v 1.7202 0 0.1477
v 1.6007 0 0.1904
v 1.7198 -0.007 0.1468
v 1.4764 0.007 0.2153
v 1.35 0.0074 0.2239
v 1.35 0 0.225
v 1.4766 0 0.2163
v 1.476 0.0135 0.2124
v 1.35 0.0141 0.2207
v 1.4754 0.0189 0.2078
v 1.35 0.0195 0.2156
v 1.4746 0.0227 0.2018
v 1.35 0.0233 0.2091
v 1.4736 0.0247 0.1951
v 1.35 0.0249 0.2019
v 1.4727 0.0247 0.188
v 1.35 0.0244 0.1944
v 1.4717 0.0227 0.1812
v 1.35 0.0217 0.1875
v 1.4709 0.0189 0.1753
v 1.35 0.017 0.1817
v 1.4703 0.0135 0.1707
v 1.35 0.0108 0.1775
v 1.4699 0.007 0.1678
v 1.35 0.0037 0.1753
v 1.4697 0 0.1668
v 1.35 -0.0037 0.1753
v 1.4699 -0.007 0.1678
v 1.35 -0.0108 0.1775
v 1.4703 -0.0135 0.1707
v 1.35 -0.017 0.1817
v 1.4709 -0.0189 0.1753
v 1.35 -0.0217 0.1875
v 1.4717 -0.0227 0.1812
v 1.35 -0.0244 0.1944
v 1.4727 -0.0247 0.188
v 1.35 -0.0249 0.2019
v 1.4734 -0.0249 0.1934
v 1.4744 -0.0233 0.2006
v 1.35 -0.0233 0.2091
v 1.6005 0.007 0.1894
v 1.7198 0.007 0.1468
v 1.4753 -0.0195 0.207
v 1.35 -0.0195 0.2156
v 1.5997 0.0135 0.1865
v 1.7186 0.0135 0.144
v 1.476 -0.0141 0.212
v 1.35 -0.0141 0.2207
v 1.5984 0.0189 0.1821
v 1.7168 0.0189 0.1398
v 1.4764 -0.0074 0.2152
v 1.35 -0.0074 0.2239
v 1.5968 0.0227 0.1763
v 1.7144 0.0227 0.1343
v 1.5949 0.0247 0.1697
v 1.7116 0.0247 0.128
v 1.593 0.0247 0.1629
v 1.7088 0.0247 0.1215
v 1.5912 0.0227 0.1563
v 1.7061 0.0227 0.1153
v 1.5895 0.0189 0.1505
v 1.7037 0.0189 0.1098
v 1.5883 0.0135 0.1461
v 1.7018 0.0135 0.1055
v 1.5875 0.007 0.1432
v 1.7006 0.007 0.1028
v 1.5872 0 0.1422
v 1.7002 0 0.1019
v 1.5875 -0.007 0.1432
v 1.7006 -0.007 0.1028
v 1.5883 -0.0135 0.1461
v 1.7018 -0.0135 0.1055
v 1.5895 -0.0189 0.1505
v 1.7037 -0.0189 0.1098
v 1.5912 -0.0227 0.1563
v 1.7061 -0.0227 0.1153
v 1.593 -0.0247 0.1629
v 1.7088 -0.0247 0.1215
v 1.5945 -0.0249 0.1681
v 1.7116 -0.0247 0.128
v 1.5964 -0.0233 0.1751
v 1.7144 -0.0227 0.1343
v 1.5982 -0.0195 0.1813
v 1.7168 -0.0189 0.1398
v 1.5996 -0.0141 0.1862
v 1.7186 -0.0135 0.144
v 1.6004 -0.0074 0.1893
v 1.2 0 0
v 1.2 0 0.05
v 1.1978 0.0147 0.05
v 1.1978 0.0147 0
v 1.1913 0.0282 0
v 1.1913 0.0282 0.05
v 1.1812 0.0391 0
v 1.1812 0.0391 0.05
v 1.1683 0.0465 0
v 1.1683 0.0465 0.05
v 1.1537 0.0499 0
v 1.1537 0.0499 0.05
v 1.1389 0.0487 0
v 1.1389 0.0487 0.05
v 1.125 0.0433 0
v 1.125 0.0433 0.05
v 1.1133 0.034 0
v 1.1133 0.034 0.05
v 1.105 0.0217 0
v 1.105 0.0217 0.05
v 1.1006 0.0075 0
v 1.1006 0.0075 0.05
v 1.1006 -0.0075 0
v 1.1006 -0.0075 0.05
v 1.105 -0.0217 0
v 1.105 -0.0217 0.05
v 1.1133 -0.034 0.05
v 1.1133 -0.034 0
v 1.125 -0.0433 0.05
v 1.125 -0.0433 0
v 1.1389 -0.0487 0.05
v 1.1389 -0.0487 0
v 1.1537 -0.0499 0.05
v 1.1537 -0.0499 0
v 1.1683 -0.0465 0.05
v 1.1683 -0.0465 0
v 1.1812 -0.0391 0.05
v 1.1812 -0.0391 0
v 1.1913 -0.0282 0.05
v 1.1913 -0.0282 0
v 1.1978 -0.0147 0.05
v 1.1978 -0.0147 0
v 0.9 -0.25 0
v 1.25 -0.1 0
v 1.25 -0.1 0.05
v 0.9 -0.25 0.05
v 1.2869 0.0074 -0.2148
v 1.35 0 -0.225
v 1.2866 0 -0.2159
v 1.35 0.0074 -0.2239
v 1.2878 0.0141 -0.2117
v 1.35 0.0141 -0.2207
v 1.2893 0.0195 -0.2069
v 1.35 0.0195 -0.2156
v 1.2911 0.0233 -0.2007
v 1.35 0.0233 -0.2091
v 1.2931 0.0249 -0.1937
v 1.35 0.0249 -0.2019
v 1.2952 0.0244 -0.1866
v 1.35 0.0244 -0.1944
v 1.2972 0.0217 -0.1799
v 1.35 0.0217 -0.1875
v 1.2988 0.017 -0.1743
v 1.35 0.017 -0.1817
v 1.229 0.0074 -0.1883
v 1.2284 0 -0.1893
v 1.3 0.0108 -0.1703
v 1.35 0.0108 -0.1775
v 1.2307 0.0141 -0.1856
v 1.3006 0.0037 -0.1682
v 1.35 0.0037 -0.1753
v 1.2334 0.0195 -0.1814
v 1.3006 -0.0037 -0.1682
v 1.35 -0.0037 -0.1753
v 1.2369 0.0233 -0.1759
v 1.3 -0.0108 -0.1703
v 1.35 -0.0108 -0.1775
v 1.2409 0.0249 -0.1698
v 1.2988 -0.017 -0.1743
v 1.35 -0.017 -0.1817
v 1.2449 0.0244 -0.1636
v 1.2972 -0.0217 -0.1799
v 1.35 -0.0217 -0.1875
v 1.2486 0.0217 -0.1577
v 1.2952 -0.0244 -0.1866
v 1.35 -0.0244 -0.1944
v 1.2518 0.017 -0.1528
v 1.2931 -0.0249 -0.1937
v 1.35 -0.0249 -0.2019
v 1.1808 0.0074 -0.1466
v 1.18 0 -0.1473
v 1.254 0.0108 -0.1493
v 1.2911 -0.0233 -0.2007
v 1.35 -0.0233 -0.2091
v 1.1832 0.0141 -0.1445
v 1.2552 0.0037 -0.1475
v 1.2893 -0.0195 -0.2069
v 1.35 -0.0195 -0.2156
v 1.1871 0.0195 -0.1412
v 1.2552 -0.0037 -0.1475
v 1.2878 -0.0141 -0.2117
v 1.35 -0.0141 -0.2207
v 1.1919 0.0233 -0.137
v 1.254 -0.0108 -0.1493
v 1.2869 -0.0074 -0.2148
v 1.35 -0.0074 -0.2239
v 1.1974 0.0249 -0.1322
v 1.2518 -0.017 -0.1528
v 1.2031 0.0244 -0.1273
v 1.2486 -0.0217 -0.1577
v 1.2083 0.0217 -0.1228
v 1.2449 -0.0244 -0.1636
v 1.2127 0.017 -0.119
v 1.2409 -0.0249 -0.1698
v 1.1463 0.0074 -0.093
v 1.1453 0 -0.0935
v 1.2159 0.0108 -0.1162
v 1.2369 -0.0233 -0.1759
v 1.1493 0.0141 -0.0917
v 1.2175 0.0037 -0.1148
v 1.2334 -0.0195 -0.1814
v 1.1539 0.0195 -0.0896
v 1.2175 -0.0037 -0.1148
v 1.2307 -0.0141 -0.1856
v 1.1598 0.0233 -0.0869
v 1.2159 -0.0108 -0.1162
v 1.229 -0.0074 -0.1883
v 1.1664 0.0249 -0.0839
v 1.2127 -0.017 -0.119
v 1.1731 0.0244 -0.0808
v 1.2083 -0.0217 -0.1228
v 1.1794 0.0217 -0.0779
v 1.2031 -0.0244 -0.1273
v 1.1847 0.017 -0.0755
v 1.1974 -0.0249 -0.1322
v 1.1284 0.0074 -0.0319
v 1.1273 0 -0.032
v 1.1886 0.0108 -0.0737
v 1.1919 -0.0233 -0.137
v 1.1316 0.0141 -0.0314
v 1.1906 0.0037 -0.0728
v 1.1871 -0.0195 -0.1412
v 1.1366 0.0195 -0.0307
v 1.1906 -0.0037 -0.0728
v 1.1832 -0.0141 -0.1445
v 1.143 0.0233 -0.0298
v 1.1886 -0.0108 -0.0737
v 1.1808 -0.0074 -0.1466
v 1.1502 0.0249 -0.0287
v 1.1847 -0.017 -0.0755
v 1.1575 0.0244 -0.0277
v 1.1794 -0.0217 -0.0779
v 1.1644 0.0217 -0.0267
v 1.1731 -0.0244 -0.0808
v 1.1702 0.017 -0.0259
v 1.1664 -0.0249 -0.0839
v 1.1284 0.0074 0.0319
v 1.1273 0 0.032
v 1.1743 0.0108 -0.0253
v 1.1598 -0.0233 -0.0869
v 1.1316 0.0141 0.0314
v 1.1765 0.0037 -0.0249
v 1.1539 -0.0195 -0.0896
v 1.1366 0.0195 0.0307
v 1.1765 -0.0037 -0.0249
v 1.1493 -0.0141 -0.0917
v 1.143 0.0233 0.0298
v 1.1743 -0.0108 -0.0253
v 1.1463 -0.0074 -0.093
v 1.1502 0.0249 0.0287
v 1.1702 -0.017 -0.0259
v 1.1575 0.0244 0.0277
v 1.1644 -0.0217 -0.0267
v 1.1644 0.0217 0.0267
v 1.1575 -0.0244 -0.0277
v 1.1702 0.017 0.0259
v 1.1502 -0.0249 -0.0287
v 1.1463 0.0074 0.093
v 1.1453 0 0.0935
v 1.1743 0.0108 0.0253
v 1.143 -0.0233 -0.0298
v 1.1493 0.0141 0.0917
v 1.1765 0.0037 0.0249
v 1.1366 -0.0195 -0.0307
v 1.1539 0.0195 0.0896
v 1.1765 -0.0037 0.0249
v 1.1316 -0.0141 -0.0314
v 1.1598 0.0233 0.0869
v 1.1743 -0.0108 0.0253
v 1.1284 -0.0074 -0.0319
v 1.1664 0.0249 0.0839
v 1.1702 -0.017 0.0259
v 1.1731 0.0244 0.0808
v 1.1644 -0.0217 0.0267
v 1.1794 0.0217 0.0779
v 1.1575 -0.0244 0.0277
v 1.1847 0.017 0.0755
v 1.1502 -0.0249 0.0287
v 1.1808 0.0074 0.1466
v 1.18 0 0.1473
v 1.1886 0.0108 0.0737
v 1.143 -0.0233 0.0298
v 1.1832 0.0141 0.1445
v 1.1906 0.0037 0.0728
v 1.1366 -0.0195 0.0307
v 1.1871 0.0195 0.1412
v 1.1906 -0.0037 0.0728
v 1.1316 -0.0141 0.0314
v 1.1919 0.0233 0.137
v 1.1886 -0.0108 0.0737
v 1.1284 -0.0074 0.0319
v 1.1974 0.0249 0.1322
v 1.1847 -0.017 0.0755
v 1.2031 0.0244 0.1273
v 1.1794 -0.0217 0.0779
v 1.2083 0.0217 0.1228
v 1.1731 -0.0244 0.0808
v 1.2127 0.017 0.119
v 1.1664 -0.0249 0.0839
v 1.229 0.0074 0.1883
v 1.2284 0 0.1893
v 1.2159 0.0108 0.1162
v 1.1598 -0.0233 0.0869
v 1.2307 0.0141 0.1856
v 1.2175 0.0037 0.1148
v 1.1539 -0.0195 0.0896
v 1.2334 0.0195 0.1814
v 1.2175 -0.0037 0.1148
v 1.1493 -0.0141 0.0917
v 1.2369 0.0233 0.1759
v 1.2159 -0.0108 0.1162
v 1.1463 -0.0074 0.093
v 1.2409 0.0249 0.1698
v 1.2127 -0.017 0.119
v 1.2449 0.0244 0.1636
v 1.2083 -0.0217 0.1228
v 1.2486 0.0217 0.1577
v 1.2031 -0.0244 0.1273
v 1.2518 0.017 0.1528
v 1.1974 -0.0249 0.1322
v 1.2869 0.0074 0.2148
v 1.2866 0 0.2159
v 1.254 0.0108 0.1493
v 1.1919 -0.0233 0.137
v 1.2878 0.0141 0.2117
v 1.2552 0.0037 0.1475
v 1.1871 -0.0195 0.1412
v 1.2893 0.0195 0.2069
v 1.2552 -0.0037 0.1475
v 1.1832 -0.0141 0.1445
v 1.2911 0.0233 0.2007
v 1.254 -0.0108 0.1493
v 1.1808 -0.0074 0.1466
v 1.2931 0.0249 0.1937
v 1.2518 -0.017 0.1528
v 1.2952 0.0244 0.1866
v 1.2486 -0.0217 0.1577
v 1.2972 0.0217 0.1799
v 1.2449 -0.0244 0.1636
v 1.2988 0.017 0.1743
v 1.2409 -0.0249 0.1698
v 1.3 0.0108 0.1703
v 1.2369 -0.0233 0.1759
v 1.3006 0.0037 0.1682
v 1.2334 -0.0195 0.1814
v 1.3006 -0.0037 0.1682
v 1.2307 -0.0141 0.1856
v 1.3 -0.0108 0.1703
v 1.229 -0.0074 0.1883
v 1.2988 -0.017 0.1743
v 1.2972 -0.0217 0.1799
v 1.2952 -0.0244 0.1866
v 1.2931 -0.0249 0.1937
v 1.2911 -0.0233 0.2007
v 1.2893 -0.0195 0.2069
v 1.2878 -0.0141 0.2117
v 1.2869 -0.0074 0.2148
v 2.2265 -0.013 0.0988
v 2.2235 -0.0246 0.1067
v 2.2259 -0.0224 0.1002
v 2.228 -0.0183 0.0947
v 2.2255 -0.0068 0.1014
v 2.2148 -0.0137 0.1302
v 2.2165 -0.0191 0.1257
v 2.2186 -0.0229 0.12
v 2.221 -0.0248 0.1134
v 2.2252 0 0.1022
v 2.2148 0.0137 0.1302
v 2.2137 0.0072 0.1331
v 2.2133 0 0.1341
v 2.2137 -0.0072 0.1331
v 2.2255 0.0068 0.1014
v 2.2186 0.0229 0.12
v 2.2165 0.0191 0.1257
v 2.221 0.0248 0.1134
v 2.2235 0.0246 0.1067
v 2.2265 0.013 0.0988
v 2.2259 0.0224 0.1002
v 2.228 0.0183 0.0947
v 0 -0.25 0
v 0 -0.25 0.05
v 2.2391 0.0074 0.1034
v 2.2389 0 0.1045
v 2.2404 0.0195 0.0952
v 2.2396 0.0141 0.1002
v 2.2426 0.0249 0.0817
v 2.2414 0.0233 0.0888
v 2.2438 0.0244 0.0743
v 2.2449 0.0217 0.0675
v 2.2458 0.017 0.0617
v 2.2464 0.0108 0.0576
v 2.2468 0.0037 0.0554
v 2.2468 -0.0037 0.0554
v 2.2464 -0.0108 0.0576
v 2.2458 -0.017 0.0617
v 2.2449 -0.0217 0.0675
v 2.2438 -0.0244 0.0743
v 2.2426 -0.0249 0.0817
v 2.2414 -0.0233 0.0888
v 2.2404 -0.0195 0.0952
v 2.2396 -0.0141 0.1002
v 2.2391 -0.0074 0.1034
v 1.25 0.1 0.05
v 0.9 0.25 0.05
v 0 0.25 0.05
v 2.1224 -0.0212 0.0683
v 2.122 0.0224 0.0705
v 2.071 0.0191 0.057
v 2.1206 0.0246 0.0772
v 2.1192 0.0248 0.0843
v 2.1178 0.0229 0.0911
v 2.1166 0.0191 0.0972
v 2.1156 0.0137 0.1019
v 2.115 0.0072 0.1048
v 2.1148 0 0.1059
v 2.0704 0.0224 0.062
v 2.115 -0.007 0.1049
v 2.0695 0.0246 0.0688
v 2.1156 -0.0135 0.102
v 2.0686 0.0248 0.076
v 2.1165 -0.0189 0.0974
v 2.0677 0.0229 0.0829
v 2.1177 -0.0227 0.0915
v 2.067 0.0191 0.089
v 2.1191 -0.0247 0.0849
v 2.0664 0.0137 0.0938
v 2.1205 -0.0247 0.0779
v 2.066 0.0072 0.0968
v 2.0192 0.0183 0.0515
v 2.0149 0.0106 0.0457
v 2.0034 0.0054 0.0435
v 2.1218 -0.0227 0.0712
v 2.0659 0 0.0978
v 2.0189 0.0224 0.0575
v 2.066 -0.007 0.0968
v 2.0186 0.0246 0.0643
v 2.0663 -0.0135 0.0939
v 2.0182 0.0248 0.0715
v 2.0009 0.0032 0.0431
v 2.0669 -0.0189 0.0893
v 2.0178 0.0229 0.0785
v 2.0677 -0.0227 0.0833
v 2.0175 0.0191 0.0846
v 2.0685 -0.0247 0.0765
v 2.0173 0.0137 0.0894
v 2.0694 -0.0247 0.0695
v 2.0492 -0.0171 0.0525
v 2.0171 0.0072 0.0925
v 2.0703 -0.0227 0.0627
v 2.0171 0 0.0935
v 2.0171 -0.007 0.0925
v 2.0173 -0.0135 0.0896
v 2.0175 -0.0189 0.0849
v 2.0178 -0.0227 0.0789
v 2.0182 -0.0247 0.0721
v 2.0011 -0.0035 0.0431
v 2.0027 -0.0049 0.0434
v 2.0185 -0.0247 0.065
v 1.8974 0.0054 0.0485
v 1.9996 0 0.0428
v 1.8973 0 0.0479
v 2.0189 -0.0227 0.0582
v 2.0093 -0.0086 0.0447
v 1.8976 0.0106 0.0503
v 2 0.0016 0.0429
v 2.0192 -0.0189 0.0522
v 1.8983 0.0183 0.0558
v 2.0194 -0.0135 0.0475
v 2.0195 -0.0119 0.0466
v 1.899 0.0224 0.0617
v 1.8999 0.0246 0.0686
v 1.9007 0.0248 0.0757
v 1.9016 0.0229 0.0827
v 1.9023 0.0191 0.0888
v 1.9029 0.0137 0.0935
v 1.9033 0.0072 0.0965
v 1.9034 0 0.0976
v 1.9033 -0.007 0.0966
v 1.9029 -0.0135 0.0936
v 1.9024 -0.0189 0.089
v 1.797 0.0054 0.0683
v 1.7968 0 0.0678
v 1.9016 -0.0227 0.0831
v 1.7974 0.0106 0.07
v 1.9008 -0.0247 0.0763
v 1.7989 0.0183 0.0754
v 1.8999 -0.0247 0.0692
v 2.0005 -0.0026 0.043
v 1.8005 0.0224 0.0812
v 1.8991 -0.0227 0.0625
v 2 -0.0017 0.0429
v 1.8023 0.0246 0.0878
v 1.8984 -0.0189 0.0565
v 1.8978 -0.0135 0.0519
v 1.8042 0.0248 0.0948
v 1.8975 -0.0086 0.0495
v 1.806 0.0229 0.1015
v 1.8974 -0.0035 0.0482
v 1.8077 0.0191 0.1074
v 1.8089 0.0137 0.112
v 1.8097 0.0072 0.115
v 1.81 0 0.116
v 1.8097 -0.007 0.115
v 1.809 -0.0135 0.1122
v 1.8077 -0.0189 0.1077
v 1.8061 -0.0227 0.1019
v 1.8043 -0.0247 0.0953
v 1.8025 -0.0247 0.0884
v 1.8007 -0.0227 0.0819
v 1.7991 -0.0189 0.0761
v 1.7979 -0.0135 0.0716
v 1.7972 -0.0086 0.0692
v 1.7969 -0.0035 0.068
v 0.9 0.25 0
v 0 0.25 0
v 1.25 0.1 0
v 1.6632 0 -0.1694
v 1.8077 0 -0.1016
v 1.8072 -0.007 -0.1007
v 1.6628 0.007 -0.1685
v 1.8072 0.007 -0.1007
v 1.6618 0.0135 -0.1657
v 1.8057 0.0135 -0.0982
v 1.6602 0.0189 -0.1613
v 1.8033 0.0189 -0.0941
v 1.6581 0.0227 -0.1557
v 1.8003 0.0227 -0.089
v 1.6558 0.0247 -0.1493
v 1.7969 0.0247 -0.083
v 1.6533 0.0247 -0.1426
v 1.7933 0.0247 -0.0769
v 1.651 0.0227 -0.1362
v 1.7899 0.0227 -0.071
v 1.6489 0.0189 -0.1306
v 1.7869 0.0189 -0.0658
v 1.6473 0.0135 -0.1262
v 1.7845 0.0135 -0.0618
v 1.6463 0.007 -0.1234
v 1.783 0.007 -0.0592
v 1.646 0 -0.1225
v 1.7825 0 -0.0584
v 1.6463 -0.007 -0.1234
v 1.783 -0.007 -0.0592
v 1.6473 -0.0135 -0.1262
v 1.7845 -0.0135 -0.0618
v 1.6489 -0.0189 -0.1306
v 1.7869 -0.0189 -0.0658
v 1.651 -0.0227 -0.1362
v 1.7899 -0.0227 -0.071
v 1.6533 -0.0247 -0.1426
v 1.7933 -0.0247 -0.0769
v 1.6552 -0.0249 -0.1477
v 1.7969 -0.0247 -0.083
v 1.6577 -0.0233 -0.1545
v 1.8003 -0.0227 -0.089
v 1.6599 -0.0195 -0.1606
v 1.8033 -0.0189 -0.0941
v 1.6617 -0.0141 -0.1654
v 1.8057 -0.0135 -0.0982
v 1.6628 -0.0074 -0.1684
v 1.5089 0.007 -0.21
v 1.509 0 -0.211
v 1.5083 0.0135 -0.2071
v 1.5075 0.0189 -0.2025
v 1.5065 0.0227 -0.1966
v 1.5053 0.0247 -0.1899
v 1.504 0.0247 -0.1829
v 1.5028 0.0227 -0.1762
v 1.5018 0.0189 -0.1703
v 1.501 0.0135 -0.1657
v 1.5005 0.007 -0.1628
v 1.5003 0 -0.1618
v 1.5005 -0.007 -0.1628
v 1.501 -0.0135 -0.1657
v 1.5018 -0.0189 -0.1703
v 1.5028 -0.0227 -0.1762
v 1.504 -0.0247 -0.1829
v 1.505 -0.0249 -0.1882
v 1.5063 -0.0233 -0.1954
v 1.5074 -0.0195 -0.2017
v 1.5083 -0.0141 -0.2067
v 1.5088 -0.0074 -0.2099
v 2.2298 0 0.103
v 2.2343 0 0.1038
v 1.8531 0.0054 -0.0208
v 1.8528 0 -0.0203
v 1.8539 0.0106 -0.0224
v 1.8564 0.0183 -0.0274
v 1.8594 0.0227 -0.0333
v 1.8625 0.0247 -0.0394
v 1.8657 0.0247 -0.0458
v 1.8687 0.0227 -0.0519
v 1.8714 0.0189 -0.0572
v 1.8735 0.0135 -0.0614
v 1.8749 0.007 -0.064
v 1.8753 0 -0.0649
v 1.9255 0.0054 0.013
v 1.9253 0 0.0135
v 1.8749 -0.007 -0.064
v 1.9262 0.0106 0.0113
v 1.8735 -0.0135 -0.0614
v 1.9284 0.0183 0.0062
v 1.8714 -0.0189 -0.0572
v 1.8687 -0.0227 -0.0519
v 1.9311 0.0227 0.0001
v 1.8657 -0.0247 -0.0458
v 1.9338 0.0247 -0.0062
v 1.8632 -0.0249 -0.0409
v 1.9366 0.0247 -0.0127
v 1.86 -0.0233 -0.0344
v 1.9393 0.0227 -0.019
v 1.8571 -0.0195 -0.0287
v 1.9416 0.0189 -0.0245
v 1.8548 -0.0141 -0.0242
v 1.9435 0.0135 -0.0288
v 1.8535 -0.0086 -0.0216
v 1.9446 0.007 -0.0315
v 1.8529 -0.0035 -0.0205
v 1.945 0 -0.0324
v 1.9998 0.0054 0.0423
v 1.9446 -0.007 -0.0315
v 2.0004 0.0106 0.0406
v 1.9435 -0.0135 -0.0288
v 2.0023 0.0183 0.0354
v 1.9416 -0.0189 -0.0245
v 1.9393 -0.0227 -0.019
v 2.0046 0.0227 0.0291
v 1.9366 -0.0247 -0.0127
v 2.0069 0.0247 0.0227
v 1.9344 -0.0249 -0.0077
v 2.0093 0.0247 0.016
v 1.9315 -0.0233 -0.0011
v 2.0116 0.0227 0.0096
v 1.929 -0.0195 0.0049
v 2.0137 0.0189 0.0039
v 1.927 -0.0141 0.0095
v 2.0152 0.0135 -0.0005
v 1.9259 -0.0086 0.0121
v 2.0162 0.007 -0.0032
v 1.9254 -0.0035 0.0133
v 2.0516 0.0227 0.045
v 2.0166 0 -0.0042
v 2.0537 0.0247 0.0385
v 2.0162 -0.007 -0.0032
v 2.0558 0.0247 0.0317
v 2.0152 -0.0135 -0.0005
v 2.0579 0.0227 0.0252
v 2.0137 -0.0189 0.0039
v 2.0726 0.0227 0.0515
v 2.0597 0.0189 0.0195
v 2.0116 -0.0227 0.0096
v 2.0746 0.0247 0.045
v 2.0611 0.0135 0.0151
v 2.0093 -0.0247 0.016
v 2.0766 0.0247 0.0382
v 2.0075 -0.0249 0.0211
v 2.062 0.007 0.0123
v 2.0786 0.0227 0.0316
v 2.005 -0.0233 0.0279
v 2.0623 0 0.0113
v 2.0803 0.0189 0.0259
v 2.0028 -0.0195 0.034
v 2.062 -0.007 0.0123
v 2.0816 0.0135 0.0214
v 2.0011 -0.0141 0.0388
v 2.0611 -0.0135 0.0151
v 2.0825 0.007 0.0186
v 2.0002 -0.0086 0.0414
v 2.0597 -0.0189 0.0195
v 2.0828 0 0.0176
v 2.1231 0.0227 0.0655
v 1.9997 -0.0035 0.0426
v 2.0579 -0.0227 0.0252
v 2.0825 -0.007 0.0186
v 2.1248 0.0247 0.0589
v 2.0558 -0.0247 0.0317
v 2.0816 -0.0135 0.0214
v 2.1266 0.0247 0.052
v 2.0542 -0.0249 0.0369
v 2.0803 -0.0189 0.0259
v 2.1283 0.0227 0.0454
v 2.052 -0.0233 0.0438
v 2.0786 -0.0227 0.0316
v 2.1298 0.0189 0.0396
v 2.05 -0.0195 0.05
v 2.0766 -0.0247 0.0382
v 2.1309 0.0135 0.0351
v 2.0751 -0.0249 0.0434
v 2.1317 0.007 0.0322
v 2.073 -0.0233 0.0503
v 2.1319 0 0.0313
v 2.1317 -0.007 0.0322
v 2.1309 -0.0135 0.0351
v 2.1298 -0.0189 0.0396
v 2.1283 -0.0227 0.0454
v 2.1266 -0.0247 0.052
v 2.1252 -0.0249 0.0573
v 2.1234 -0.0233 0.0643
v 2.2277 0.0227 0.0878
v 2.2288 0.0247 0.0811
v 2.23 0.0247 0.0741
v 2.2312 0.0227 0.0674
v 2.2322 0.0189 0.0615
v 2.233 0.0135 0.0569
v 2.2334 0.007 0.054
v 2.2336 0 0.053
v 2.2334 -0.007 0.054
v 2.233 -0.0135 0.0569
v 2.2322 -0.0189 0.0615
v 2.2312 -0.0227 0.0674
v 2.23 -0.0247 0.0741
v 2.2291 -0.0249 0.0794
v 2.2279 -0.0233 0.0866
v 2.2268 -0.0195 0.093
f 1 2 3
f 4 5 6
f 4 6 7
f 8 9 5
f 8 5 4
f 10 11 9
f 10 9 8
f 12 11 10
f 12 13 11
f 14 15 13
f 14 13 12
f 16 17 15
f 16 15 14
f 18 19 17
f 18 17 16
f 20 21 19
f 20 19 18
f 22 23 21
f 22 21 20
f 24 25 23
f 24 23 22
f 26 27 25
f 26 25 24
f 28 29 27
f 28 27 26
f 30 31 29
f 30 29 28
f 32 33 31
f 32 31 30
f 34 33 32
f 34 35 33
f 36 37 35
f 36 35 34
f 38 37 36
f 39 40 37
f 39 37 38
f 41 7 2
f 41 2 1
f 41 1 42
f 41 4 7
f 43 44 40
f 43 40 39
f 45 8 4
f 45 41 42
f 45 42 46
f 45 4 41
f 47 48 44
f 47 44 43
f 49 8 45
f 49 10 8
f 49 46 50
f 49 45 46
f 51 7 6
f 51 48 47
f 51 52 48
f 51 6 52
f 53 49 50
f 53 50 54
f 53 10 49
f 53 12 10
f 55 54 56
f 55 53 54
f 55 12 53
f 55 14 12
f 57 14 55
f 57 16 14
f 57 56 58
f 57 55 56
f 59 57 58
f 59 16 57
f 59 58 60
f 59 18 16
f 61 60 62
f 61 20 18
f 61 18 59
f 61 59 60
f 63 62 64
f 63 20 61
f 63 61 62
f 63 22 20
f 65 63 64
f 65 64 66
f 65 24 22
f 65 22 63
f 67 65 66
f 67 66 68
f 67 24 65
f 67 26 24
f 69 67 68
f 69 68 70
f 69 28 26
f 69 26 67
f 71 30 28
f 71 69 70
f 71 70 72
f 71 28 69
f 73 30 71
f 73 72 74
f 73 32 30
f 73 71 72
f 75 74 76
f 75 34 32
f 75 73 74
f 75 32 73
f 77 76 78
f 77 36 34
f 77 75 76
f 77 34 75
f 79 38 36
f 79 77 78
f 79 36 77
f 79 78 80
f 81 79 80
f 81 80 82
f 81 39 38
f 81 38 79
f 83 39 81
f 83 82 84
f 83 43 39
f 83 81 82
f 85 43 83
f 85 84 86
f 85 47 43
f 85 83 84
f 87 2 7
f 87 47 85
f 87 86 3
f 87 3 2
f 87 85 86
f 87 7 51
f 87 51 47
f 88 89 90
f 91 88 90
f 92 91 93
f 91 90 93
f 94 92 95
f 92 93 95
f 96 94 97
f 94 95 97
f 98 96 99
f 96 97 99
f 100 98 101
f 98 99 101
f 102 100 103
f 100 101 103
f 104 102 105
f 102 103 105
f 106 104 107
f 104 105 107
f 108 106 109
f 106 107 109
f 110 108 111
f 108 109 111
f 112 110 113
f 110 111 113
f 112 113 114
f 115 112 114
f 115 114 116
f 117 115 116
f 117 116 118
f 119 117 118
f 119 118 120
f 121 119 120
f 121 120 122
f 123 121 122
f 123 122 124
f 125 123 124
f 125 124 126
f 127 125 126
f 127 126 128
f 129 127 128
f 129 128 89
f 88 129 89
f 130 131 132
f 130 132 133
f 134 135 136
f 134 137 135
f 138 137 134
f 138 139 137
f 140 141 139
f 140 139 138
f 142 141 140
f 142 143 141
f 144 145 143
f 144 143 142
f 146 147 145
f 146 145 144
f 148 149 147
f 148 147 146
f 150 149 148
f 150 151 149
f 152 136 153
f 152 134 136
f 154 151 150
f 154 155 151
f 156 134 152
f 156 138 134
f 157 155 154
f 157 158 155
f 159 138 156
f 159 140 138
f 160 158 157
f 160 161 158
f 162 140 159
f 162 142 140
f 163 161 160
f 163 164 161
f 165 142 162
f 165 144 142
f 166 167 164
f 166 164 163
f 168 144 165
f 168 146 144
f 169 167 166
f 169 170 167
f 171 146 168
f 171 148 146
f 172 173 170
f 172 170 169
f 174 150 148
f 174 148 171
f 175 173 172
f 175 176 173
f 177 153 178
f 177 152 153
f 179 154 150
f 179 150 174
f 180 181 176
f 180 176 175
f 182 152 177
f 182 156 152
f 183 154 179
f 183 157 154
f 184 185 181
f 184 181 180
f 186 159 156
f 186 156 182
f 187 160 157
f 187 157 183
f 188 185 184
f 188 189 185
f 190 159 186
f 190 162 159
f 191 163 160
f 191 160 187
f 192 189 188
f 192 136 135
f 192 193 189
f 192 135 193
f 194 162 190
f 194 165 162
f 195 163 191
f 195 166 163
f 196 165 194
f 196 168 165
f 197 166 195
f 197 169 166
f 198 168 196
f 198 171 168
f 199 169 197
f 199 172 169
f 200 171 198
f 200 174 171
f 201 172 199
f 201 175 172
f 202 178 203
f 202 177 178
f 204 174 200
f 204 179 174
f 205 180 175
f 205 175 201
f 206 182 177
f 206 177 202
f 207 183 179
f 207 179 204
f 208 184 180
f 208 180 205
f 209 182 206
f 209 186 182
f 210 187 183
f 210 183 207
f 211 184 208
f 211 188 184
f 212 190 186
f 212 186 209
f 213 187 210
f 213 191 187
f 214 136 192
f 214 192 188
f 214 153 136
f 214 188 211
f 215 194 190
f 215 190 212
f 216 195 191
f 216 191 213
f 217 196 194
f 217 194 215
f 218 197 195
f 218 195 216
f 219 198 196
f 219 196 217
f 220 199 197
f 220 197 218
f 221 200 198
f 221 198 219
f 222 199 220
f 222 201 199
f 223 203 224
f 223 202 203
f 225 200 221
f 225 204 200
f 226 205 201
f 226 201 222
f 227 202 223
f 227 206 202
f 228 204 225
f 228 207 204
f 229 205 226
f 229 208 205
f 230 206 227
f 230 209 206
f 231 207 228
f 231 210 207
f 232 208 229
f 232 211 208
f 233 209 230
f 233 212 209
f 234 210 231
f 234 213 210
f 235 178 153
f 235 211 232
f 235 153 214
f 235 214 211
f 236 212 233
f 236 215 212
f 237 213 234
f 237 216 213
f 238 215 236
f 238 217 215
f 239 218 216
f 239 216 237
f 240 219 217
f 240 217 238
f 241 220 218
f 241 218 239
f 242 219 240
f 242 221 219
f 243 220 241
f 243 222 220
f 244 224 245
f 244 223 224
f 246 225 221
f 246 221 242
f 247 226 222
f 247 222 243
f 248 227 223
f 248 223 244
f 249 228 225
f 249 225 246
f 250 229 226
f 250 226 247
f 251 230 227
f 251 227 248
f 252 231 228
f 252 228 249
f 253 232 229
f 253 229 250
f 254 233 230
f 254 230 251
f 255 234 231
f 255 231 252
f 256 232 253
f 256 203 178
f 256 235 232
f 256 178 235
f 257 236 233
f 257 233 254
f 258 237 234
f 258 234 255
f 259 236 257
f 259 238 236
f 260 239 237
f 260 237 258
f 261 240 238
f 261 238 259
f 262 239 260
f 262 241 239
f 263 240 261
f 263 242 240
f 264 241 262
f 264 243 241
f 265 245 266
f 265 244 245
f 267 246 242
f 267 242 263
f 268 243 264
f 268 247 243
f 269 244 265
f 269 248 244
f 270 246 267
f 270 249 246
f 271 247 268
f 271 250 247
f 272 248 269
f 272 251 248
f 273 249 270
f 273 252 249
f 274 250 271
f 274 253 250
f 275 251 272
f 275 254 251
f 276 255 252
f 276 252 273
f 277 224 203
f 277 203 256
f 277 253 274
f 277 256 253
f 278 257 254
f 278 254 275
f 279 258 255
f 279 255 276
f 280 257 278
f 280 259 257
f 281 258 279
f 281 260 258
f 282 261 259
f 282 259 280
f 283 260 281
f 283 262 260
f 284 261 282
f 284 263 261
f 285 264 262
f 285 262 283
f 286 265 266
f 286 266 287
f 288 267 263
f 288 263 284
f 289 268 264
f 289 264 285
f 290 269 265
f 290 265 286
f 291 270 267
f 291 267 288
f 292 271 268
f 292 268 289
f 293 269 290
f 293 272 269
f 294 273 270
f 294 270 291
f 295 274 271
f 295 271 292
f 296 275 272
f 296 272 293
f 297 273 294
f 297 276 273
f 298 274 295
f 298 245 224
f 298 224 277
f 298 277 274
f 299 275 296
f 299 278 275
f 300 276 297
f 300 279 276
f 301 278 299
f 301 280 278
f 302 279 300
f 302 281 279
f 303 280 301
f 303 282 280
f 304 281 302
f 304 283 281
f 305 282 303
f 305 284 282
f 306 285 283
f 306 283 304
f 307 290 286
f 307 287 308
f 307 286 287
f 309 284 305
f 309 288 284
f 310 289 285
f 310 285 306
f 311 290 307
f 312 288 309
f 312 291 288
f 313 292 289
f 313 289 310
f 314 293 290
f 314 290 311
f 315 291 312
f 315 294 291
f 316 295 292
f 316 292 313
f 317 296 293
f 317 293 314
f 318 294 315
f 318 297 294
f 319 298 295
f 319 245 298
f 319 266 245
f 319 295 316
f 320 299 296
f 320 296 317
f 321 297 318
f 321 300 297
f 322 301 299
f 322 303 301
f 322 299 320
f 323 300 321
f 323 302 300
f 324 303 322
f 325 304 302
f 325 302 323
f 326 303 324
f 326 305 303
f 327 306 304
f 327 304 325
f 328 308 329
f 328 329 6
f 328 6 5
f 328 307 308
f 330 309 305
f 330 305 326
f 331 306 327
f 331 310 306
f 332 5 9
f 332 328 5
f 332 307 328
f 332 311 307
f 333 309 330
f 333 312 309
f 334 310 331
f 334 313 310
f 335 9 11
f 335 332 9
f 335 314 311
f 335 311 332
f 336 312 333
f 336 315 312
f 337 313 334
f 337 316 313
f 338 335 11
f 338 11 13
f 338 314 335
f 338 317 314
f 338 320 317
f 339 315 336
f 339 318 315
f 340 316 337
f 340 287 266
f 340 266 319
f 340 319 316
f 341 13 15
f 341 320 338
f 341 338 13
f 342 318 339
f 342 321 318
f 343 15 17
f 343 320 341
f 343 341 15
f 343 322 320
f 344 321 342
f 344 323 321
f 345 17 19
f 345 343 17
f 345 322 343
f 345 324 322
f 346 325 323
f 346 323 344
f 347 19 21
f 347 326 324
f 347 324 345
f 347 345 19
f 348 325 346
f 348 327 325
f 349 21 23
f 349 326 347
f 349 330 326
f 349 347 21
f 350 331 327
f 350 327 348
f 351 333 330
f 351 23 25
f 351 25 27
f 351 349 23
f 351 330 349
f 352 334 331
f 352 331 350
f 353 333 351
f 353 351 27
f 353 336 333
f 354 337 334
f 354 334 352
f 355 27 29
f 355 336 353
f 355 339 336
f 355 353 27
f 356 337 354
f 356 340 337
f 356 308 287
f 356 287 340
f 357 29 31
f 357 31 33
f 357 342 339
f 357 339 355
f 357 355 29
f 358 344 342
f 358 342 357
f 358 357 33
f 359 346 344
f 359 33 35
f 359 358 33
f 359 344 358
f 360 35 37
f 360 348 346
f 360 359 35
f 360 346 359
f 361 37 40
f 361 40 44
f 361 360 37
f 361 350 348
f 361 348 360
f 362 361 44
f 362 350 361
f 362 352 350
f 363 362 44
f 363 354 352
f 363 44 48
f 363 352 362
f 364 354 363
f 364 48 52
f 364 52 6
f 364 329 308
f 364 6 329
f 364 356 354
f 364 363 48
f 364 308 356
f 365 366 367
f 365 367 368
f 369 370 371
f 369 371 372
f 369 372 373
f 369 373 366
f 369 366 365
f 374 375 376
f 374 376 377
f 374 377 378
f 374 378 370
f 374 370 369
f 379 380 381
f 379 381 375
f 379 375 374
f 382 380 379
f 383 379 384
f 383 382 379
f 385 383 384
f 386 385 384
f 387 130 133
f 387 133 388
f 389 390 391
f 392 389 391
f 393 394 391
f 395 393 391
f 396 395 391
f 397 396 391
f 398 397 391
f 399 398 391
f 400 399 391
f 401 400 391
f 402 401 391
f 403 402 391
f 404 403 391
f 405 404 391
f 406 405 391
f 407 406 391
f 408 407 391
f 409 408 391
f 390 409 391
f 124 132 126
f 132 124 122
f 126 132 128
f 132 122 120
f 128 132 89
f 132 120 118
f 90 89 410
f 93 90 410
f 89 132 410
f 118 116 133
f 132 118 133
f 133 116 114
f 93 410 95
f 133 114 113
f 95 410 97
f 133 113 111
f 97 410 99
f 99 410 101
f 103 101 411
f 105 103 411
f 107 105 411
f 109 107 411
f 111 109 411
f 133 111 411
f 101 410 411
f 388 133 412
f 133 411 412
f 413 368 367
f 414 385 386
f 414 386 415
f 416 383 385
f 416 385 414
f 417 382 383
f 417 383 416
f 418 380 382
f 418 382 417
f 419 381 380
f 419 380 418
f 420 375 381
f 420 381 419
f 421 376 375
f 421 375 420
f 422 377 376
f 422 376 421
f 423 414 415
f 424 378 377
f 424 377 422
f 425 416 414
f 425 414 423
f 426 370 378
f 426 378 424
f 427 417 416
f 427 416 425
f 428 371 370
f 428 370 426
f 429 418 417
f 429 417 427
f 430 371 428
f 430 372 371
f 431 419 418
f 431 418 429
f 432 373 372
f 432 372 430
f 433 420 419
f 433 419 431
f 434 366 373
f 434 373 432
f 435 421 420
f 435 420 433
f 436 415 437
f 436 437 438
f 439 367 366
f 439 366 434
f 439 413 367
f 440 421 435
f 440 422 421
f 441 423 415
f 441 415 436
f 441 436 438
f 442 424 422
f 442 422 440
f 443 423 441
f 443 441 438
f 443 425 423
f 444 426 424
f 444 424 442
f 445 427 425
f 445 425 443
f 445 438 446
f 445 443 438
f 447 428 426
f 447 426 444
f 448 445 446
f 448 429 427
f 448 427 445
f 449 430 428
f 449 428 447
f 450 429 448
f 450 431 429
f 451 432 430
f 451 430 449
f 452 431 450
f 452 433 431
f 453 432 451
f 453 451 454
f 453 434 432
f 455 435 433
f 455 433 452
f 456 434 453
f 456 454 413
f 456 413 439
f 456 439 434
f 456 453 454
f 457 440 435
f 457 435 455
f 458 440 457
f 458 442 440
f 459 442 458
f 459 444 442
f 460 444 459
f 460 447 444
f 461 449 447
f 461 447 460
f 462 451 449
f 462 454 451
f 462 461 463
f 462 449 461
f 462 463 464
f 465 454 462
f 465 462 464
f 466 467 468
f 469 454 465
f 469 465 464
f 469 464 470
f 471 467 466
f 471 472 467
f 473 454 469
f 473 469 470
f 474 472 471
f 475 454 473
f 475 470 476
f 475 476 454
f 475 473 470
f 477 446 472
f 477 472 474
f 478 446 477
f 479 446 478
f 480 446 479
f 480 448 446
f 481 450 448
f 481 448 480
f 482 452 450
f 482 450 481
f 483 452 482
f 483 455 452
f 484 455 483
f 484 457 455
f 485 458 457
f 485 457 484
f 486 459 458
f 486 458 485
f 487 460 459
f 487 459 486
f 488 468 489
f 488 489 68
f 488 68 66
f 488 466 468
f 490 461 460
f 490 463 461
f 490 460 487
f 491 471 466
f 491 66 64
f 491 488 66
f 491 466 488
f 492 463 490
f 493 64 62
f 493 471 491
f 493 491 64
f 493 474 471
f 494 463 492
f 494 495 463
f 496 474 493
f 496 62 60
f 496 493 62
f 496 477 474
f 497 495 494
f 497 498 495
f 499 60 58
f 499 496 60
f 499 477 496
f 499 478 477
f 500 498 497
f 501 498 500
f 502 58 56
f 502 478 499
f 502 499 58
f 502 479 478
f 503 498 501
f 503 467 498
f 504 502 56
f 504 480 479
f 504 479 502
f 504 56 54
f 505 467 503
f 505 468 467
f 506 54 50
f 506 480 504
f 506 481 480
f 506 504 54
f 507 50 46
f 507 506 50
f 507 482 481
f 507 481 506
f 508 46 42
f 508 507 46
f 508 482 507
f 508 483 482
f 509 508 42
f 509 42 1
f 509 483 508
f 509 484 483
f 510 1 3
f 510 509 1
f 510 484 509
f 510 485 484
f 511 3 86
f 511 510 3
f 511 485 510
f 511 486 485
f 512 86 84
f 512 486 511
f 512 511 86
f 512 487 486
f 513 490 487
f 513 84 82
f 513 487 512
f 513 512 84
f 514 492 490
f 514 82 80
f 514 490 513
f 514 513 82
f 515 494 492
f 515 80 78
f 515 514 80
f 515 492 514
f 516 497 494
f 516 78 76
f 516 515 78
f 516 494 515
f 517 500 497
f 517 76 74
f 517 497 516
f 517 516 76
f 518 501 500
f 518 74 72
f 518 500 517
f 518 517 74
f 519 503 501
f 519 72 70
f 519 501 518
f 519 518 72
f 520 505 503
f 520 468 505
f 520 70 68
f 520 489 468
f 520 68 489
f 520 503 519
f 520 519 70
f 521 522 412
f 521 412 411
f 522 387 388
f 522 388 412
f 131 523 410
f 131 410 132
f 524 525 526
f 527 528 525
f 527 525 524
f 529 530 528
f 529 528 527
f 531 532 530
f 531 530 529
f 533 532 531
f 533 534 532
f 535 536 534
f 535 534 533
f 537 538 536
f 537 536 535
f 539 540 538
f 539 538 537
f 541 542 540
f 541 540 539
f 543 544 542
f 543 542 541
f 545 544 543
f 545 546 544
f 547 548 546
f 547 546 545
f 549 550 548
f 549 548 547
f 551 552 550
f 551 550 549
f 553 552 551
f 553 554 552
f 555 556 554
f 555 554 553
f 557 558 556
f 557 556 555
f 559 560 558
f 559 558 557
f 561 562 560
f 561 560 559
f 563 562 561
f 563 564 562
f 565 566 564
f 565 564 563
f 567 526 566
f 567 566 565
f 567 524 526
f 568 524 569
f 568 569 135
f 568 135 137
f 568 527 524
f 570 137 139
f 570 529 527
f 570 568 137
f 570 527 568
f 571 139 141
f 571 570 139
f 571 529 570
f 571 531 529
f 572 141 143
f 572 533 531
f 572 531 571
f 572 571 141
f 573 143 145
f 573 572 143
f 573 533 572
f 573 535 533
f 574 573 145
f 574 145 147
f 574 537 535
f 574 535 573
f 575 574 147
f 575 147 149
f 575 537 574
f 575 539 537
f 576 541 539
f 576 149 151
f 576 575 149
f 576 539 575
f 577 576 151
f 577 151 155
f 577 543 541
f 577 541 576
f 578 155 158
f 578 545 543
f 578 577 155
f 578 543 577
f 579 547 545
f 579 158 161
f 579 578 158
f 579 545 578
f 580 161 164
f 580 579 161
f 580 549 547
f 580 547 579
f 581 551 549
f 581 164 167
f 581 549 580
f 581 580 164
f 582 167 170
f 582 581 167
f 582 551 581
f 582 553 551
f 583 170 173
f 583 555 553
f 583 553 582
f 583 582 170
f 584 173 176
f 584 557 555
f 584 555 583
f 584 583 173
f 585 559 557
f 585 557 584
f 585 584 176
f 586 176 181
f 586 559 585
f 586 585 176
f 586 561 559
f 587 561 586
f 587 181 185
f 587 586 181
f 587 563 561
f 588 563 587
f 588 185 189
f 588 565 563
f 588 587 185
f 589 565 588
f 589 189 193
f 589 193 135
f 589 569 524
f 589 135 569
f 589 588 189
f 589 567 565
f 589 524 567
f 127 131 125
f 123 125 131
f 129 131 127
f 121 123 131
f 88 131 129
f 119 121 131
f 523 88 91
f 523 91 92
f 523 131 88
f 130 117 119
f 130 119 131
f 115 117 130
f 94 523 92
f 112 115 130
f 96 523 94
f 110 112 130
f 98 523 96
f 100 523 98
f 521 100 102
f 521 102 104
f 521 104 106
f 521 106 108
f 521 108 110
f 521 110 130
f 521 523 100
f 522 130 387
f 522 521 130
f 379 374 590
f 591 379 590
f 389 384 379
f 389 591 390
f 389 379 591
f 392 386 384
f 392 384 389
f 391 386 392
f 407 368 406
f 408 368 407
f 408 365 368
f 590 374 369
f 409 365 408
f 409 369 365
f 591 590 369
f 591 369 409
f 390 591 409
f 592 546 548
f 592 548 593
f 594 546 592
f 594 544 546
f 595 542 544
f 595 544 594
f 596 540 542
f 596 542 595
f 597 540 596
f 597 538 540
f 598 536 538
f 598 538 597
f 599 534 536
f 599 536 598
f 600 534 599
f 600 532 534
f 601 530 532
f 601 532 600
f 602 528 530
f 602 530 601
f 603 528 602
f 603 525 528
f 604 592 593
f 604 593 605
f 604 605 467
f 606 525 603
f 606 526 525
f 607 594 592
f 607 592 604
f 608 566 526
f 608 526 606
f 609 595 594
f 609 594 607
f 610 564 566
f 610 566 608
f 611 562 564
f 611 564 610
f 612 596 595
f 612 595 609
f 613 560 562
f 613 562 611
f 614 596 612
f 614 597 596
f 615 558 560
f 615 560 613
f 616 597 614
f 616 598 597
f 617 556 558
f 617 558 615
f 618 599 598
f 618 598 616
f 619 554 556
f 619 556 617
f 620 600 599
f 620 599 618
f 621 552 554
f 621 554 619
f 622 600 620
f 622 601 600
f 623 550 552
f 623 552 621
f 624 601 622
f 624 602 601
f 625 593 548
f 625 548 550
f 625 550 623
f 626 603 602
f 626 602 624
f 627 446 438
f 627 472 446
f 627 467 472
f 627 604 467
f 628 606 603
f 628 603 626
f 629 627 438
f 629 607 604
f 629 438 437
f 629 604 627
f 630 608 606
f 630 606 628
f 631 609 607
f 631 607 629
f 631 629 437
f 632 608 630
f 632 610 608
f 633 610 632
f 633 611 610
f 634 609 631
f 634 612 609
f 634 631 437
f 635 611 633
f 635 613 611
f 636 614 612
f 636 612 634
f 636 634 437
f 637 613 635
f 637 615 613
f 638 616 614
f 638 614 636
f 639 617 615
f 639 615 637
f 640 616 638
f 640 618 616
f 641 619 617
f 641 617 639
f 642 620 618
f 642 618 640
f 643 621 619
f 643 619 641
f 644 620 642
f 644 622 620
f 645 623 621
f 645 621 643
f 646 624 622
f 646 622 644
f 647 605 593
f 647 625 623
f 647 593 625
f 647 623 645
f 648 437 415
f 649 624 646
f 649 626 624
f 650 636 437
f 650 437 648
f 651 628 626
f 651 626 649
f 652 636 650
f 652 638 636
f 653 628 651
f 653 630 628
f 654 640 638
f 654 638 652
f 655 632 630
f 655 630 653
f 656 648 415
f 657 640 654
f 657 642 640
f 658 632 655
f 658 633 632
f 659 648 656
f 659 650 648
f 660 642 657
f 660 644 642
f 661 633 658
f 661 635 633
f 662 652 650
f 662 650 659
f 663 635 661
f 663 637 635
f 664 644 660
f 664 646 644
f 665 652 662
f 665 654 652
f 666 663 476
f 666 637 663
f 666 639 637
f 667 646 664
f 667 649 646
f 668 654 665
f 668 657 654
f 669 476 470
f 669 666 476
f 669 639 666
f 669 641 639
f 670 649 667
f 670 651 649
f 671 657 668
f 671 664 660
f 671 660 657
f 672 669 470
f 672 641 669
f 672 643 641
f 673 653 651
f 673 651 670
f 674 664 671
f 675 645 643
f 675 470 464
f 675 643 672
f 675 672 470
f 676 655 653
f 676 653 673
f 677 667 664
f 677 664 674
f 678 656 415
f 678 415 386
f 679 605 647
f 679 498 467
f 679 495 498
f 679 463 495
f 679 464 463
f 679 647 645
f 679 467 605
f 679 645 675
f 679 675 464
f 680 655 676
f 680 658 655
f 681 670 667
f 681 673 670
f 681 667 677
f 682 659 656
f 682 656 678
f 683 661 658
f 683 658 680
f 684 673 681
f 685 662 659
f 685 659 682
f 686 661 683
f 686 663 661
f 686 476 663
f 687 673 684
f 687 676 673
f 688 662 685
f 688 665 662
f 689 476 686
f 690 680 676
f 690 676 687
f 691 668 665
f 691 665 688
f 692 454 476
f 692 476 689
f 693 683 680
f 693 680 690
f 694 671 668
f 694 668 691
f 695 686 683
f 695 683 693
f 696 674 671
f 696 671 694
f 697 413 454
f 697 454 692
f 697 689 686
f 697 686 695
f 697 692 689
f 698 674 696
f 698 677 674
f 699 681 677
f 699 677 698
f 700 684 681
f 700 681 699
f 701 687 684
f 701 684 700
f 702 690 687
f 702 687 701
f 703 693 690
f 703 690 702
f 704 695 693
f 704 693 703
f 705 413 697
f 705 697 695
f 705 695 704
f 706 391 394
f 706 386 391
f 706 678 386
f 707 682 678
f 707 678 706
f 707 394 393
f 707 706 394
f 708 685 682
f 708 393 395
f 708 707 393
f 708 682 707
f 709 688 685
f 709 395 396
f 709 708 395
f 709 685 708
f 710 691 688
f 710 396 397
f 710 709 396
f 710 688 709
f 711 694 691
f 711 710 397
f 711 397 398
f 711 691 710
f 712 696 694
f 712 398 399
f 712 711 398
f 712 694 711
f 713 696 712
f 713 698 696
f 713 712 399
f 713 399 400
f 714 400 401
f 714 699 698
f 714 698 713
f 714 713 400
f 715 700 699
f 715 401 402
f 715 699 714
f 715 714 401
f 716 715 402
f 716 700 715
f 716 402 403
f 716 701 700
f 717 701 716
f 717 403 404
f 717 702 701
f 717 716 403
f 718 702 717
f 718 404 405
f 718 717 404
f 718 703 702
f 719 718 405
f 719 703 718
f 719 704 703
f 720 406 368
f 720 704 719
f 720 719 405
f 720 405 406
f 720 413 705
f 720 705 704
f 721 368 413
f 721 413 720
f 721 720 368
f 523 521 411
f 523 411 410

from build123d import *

# Parameters (mm, degrees)
BOSS_EXTRUDE1_DEPTH = 0.05
SKETCH2_R           = 0.05
CUT_EXTRUDE1_DEPTH  = 2.275735082
SWEEP5_OUTLINE_R    = 0.025
SWEEP5_ANGLE        = 44.018601
SWEEP5_2_OUTLINE_R  = 0.025
SWEEP5_2_ANGLE      = 23.592683
SWEEP5_3_OUTLINE_R  = 0.025
SWEEP5_3_ANGLE      = 180
SWEEP5_4_OUTLINE_R  = 0.025
SWEEP5_4_ANGLE      = 30.182755
SWEEP5_5_OUTLINE_R  = 0.025
SWEEP5_5_ANGLE      = 21.084851


with BuildPart() as part:
    # Sketch1 → Boss-Extrude1 (new body)
    with BuildSketch(Plane.XY):
        Polygon((0, -0.25), (0, 0.25), (0.9, 0.25), (1.25, 0.1), (1.25, -0.1), (0.9, -0.25), align=None)
    extrude(amount=BOSS_EXTRUDE1_DEPTH)

    # Sketch2 → Cut-Extrude1 (cut, through all)
    with BuildSketch(Plane.XY.offset(0.05)):
        with Locations((1.15, 0)):
            Circle(SKETCH2_R)
    extrude(amount=-CUT_EXTRUDE1_DEPTH, mode=Mode.SUBTRACT)


with BuildPart() as body_2:
    # Sweep5: read off the stored shape, not the designer's step
    # Sweep5 outline → Sweep5 (revolve)
    with BuildSketch(Plane(origin=(1.983644538, 0, 0.750853873), x_dir=(0.3489959997719201, 0, -0.9371242138282405), z_dir=(0.9371242138282405, 0, 0.3489959997719201))):
        with Locations((0.683186889, 0)):
            Circle(SWEEP5_OUTLINE_R)
    revolve(axis=Axis((1.983644538, 0, 0.750853873), (0, 1, 0)), revolution_arc=SWEEP5_ANGLE)

    # Sweep5 2 outline → Sweep5 2 (revolve)
    with BuildSketch(Plane(origin=(1.35, 0, -0.700006175), x_dir=(0, 0, 1), z_dir=(-1, 0, 0))):
        with Locations((0.900006175, 0)):
            Circle(SWEEP5_2_OUTLINE_R)
    revolve(axis=Axis((1.35, 0, -0.700006175), (0, 1, 0)), revolution_arc=SWEEP5_2_ANGLE)

    # Sweep5 3 outline → Sweep5 3 (revolve)
    with BuildSketch(Plane(origin=(1.35, 0, 0), x_dir=(0, 0, -1), z_dir=(1, 0, 0))):
        with Locations((0.2, 0)):
            Circle(SWEEP5_3_OUTLINE_R)
    revolve(axis=Axis((1.35, 0, 0), (0, 1, 0)), revolution_arc=SWEEP5_3_ANGLE)

    # Sweep5 4 outline → Sweep5 4 (revolve)
    with BuildSketch(Plane(origin=(1.35, 0, 0.685324543), x_dir=(0.5027597968291189, 0, -0.8644261603470497), z_dir=(0.8644261603470497, 0, 0.5027597968291189))):
        with Locations((0.885324543, 0)):
            Circle(SWEEP5_4_OUTLINE_R)
    revolve(axis=Axis((1.35, 0, 0.685324543), (0, 1, 0)), revolution_arc=SWEEP5_4_ANGLE)

    # Sweep5 5 outline → Sweep5 5 (revolve)
    with BuildSketch(Plane(origin=(2.448323774, 0, -1.203091772), x_dir=(-0.502759796829121, 0, 0.8644261603470483), z_dir=(-0.8644261603470483, 0, -0.502759796829121))):
        with Locations((1.299264959, 0)):
            Circle(SWEEP5_5_OUTLINE_R)
    revolve(axis=Axis((2.448323774, 0, -1.203091772), (0, 1, 0)), revolution_arc=SWEEP5_5_ANGLE)


solid = Compound([part.part, body_2.part])
